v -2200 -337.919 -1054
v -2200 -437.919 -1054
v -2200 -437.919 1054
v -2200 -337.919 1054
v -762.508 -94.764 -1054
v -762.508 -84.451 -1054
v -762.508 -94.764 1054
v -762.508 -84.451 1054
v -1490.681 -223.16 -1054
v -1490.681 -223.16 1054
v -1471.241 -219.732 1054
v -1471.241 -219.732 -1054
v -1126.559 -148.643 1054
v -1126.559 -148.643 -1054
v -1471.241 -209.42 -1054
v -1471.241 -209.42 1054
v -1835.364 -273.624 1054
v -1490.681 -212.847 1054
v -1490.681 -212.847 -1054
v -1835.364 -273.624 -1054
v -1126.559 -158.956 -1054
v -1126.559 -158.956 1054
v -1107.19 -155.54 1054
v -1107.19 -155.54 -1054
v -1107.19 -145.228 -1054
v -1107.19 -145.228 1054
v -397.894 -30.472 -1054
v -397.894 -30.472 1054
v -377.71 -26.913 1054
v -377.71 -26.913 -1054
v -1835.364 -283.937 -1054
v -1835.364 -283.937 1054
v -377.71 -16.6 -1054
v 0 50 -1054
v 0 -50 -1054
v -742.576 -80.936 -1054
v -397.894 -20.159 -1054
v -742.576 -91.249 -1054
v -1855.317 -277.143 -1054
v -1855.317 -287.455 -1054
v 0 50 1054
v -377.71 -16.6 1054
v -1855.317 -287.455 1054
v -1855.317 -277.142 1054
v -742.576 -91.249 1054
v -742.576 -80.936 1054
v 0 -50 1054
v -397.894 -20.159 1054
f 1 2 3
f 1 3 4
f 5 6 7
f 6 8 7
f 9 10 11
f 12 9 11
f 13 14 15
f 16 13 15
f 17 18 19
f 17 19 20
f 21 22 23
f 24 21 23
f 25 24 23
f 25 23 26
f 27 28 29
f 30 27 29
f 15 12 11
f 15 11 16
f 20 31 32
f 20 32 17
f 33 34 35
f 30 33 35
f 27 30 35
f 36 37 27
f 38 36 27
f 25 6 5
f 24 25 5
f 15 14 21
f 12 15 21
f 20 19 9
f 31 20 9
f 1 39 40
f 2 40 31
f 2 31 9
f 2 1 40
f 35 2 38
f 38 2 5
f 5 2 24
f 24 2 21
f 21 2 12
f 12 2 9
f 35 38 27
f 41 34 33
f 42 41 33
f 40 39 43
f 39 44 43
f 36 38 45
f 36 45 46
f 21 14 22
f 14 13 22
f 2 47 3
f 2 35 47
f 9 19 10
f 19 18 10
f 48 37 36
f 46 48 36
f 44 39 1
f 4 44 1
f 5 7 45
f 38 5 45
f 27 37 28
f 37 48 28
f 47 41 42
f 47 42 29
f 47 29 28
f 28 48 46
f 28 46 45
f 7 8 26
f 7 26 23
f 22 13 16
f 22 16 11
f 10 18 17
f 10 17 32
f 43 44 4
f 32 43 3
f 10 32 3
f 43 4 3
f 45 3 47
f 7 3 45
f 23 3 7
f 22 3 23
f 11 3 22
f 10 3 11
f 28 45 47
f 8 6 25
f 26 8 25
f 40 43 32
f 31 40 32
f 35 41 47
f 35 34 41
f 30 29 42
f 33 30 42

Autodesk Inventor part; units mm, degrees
ref_plane "YZ Plane" through (0, 0, 0) normal (1, 0, 0) x (0, 1, 0)
sketch "Sketch1" plane through (0, 0, 0) normal (1, 0, 0) x (0, 1, 0)
  line L0 (-50, 1054) -> (50, 1054)
  line L1 (50, 1054) -> (50, -1054)
  line L2 (50, -1054) -> (-50, -1054)
  line L3 (-50, -1054) -> (-50, 1054)
  line L4 (-50, 1054) -> (50, -1054) construction
  line L5 (50, 1054) -> (-50, -1054) construction
  point P0 (0, 0)
  dimension "d0" = 100
  dimension "d1" = 2108
ref_plane "Work Plane2" through (-2200, 50, 1054) normal (-1, 0, 0) x (0, 0, -1)
ref_plane "Work Plane1" through (0, 50, 1054) normal (-1, 0, 0) x (0, 0, -1)
sketch "Sketch2" plane through (-2200, 50, 1054) normal (-1, 0, 0) x (0, 0, -1)
  line L0 (0, 0) -> (2108, 0) projected
  line L1 (2108, 0) -> (2108, 100) projected
  line L2 (0, 100) -> (0, 0) projected
  point P0 (1054, 50)
ref_plane "Work Plane3" through (0, 50, -1054) normal (0, 0, -1) x (0, -1, 0)
sketch "Sketch3" plane through (0, 50, -1054) normal (0, 0, -1) x (0, -1, 0)
  line L0 (0, 0) -> (100, 0) projected
  line L1 (0, 2200) -> (100, 2200) projected
  line L2 (0, 0) -> (387.9194, 2200)
  line L3 (0, 0) -> (2233.9385, 0) construction
  line L4 (100, 0) -> (487.9194, 2200)
  line L5 (100, 0) -> (2333.9385, 0) construction
  line L6 (487.9194, 2200) -> (387.9194, 2200)
  line L7 (0, 0) -> (100, 0)
  point P0 (50, 0)
  dimension "d3" = 80
  dimension "d4" = 80
extrude "Extrusion1" add sketch "Sketch3" against normal blind 2108
sketch "Sketch4" plane through (0, 50, 1054) normal (0, 0, 1) x (1, 0, 0)
  line L0 (0, 0) -> (-2200, -387.9194) projected
  line L1 (-2200, -387.9194) -> (-1855.3173, -327.1425)
  line L2 (-1855.3173, -327.1425) -> (-1855.3173, -337.4554)
  line L3 (-1855.3173, -337.4554) -> (-1835.3641, -333.9371)
  line L4 (-1835.3641, -333.9371) -> (-1835.3641, -323.6242)
  line L5 (-1835.3641, -323.6242) -> (-1490.6814, -262.8474)
  line L6 (-1490.6814, -262.8474) -> (-1490.6814, -273.1602)
  line L7 (-1490.6814, -273.1602) -> (-1471.2413, -269.7324)
  line L8 (-1471.2413, -269.7324) -> (-1471.2413, -259.4195)
  line L9 (-1471.2413, -259.4195) -> (-1126.5586, -198.6427)
  line L10 (-1126.5586, -198.6427) -> (-1126.5586, -208.9555)
  line L11 (-1126.5586, -208.9555) -> (-1107.1904, -205.5404)
  line L12 (-1107.1904, -205.5404) -> (-1107.1904, -195.2275)
  line L13 (-1107.1904, -195.2275) -> (-762.5076, -134.4507)
  line L14 (-762.5076, -134.4507) -> (-762.5076, -144.7635)
  line L15 (-762.5076, -144.7635) -> (-742.5762, -141.2491)
  line L16 (-742.5762, -141.2491) -> (-742.5762, -130.9362)
  line L17 (-742.5762, -130.9362) -> (-397.8935, -70.1594)
  line L18 (-397.8935, -70.1594) -> (-397.8935, -80.4722)
  line L19 (-397.8935, -80.4722) -> (-377.71, -76.9133)
  line L20 (-377.71, -76.9133) -> (-377.71, -66.6005)
  line L21 (-377.71, -66.6005) -> (0, 0)
  line L22 (-377.71, -66.6005) -> (-1855.3173, -327.1425)
  point P0 (0, -50)
  dimension "d7" = 350
  dimension "d8" = 350
  dimension "d9" = 350
  dimension "d10" = 350
  dimension "d11" = 350
extrude "Extrusion2" cut sketch "Sketch4" against normal through all
properties part number "eave_panel_side_" material "Wood (Maple)"
